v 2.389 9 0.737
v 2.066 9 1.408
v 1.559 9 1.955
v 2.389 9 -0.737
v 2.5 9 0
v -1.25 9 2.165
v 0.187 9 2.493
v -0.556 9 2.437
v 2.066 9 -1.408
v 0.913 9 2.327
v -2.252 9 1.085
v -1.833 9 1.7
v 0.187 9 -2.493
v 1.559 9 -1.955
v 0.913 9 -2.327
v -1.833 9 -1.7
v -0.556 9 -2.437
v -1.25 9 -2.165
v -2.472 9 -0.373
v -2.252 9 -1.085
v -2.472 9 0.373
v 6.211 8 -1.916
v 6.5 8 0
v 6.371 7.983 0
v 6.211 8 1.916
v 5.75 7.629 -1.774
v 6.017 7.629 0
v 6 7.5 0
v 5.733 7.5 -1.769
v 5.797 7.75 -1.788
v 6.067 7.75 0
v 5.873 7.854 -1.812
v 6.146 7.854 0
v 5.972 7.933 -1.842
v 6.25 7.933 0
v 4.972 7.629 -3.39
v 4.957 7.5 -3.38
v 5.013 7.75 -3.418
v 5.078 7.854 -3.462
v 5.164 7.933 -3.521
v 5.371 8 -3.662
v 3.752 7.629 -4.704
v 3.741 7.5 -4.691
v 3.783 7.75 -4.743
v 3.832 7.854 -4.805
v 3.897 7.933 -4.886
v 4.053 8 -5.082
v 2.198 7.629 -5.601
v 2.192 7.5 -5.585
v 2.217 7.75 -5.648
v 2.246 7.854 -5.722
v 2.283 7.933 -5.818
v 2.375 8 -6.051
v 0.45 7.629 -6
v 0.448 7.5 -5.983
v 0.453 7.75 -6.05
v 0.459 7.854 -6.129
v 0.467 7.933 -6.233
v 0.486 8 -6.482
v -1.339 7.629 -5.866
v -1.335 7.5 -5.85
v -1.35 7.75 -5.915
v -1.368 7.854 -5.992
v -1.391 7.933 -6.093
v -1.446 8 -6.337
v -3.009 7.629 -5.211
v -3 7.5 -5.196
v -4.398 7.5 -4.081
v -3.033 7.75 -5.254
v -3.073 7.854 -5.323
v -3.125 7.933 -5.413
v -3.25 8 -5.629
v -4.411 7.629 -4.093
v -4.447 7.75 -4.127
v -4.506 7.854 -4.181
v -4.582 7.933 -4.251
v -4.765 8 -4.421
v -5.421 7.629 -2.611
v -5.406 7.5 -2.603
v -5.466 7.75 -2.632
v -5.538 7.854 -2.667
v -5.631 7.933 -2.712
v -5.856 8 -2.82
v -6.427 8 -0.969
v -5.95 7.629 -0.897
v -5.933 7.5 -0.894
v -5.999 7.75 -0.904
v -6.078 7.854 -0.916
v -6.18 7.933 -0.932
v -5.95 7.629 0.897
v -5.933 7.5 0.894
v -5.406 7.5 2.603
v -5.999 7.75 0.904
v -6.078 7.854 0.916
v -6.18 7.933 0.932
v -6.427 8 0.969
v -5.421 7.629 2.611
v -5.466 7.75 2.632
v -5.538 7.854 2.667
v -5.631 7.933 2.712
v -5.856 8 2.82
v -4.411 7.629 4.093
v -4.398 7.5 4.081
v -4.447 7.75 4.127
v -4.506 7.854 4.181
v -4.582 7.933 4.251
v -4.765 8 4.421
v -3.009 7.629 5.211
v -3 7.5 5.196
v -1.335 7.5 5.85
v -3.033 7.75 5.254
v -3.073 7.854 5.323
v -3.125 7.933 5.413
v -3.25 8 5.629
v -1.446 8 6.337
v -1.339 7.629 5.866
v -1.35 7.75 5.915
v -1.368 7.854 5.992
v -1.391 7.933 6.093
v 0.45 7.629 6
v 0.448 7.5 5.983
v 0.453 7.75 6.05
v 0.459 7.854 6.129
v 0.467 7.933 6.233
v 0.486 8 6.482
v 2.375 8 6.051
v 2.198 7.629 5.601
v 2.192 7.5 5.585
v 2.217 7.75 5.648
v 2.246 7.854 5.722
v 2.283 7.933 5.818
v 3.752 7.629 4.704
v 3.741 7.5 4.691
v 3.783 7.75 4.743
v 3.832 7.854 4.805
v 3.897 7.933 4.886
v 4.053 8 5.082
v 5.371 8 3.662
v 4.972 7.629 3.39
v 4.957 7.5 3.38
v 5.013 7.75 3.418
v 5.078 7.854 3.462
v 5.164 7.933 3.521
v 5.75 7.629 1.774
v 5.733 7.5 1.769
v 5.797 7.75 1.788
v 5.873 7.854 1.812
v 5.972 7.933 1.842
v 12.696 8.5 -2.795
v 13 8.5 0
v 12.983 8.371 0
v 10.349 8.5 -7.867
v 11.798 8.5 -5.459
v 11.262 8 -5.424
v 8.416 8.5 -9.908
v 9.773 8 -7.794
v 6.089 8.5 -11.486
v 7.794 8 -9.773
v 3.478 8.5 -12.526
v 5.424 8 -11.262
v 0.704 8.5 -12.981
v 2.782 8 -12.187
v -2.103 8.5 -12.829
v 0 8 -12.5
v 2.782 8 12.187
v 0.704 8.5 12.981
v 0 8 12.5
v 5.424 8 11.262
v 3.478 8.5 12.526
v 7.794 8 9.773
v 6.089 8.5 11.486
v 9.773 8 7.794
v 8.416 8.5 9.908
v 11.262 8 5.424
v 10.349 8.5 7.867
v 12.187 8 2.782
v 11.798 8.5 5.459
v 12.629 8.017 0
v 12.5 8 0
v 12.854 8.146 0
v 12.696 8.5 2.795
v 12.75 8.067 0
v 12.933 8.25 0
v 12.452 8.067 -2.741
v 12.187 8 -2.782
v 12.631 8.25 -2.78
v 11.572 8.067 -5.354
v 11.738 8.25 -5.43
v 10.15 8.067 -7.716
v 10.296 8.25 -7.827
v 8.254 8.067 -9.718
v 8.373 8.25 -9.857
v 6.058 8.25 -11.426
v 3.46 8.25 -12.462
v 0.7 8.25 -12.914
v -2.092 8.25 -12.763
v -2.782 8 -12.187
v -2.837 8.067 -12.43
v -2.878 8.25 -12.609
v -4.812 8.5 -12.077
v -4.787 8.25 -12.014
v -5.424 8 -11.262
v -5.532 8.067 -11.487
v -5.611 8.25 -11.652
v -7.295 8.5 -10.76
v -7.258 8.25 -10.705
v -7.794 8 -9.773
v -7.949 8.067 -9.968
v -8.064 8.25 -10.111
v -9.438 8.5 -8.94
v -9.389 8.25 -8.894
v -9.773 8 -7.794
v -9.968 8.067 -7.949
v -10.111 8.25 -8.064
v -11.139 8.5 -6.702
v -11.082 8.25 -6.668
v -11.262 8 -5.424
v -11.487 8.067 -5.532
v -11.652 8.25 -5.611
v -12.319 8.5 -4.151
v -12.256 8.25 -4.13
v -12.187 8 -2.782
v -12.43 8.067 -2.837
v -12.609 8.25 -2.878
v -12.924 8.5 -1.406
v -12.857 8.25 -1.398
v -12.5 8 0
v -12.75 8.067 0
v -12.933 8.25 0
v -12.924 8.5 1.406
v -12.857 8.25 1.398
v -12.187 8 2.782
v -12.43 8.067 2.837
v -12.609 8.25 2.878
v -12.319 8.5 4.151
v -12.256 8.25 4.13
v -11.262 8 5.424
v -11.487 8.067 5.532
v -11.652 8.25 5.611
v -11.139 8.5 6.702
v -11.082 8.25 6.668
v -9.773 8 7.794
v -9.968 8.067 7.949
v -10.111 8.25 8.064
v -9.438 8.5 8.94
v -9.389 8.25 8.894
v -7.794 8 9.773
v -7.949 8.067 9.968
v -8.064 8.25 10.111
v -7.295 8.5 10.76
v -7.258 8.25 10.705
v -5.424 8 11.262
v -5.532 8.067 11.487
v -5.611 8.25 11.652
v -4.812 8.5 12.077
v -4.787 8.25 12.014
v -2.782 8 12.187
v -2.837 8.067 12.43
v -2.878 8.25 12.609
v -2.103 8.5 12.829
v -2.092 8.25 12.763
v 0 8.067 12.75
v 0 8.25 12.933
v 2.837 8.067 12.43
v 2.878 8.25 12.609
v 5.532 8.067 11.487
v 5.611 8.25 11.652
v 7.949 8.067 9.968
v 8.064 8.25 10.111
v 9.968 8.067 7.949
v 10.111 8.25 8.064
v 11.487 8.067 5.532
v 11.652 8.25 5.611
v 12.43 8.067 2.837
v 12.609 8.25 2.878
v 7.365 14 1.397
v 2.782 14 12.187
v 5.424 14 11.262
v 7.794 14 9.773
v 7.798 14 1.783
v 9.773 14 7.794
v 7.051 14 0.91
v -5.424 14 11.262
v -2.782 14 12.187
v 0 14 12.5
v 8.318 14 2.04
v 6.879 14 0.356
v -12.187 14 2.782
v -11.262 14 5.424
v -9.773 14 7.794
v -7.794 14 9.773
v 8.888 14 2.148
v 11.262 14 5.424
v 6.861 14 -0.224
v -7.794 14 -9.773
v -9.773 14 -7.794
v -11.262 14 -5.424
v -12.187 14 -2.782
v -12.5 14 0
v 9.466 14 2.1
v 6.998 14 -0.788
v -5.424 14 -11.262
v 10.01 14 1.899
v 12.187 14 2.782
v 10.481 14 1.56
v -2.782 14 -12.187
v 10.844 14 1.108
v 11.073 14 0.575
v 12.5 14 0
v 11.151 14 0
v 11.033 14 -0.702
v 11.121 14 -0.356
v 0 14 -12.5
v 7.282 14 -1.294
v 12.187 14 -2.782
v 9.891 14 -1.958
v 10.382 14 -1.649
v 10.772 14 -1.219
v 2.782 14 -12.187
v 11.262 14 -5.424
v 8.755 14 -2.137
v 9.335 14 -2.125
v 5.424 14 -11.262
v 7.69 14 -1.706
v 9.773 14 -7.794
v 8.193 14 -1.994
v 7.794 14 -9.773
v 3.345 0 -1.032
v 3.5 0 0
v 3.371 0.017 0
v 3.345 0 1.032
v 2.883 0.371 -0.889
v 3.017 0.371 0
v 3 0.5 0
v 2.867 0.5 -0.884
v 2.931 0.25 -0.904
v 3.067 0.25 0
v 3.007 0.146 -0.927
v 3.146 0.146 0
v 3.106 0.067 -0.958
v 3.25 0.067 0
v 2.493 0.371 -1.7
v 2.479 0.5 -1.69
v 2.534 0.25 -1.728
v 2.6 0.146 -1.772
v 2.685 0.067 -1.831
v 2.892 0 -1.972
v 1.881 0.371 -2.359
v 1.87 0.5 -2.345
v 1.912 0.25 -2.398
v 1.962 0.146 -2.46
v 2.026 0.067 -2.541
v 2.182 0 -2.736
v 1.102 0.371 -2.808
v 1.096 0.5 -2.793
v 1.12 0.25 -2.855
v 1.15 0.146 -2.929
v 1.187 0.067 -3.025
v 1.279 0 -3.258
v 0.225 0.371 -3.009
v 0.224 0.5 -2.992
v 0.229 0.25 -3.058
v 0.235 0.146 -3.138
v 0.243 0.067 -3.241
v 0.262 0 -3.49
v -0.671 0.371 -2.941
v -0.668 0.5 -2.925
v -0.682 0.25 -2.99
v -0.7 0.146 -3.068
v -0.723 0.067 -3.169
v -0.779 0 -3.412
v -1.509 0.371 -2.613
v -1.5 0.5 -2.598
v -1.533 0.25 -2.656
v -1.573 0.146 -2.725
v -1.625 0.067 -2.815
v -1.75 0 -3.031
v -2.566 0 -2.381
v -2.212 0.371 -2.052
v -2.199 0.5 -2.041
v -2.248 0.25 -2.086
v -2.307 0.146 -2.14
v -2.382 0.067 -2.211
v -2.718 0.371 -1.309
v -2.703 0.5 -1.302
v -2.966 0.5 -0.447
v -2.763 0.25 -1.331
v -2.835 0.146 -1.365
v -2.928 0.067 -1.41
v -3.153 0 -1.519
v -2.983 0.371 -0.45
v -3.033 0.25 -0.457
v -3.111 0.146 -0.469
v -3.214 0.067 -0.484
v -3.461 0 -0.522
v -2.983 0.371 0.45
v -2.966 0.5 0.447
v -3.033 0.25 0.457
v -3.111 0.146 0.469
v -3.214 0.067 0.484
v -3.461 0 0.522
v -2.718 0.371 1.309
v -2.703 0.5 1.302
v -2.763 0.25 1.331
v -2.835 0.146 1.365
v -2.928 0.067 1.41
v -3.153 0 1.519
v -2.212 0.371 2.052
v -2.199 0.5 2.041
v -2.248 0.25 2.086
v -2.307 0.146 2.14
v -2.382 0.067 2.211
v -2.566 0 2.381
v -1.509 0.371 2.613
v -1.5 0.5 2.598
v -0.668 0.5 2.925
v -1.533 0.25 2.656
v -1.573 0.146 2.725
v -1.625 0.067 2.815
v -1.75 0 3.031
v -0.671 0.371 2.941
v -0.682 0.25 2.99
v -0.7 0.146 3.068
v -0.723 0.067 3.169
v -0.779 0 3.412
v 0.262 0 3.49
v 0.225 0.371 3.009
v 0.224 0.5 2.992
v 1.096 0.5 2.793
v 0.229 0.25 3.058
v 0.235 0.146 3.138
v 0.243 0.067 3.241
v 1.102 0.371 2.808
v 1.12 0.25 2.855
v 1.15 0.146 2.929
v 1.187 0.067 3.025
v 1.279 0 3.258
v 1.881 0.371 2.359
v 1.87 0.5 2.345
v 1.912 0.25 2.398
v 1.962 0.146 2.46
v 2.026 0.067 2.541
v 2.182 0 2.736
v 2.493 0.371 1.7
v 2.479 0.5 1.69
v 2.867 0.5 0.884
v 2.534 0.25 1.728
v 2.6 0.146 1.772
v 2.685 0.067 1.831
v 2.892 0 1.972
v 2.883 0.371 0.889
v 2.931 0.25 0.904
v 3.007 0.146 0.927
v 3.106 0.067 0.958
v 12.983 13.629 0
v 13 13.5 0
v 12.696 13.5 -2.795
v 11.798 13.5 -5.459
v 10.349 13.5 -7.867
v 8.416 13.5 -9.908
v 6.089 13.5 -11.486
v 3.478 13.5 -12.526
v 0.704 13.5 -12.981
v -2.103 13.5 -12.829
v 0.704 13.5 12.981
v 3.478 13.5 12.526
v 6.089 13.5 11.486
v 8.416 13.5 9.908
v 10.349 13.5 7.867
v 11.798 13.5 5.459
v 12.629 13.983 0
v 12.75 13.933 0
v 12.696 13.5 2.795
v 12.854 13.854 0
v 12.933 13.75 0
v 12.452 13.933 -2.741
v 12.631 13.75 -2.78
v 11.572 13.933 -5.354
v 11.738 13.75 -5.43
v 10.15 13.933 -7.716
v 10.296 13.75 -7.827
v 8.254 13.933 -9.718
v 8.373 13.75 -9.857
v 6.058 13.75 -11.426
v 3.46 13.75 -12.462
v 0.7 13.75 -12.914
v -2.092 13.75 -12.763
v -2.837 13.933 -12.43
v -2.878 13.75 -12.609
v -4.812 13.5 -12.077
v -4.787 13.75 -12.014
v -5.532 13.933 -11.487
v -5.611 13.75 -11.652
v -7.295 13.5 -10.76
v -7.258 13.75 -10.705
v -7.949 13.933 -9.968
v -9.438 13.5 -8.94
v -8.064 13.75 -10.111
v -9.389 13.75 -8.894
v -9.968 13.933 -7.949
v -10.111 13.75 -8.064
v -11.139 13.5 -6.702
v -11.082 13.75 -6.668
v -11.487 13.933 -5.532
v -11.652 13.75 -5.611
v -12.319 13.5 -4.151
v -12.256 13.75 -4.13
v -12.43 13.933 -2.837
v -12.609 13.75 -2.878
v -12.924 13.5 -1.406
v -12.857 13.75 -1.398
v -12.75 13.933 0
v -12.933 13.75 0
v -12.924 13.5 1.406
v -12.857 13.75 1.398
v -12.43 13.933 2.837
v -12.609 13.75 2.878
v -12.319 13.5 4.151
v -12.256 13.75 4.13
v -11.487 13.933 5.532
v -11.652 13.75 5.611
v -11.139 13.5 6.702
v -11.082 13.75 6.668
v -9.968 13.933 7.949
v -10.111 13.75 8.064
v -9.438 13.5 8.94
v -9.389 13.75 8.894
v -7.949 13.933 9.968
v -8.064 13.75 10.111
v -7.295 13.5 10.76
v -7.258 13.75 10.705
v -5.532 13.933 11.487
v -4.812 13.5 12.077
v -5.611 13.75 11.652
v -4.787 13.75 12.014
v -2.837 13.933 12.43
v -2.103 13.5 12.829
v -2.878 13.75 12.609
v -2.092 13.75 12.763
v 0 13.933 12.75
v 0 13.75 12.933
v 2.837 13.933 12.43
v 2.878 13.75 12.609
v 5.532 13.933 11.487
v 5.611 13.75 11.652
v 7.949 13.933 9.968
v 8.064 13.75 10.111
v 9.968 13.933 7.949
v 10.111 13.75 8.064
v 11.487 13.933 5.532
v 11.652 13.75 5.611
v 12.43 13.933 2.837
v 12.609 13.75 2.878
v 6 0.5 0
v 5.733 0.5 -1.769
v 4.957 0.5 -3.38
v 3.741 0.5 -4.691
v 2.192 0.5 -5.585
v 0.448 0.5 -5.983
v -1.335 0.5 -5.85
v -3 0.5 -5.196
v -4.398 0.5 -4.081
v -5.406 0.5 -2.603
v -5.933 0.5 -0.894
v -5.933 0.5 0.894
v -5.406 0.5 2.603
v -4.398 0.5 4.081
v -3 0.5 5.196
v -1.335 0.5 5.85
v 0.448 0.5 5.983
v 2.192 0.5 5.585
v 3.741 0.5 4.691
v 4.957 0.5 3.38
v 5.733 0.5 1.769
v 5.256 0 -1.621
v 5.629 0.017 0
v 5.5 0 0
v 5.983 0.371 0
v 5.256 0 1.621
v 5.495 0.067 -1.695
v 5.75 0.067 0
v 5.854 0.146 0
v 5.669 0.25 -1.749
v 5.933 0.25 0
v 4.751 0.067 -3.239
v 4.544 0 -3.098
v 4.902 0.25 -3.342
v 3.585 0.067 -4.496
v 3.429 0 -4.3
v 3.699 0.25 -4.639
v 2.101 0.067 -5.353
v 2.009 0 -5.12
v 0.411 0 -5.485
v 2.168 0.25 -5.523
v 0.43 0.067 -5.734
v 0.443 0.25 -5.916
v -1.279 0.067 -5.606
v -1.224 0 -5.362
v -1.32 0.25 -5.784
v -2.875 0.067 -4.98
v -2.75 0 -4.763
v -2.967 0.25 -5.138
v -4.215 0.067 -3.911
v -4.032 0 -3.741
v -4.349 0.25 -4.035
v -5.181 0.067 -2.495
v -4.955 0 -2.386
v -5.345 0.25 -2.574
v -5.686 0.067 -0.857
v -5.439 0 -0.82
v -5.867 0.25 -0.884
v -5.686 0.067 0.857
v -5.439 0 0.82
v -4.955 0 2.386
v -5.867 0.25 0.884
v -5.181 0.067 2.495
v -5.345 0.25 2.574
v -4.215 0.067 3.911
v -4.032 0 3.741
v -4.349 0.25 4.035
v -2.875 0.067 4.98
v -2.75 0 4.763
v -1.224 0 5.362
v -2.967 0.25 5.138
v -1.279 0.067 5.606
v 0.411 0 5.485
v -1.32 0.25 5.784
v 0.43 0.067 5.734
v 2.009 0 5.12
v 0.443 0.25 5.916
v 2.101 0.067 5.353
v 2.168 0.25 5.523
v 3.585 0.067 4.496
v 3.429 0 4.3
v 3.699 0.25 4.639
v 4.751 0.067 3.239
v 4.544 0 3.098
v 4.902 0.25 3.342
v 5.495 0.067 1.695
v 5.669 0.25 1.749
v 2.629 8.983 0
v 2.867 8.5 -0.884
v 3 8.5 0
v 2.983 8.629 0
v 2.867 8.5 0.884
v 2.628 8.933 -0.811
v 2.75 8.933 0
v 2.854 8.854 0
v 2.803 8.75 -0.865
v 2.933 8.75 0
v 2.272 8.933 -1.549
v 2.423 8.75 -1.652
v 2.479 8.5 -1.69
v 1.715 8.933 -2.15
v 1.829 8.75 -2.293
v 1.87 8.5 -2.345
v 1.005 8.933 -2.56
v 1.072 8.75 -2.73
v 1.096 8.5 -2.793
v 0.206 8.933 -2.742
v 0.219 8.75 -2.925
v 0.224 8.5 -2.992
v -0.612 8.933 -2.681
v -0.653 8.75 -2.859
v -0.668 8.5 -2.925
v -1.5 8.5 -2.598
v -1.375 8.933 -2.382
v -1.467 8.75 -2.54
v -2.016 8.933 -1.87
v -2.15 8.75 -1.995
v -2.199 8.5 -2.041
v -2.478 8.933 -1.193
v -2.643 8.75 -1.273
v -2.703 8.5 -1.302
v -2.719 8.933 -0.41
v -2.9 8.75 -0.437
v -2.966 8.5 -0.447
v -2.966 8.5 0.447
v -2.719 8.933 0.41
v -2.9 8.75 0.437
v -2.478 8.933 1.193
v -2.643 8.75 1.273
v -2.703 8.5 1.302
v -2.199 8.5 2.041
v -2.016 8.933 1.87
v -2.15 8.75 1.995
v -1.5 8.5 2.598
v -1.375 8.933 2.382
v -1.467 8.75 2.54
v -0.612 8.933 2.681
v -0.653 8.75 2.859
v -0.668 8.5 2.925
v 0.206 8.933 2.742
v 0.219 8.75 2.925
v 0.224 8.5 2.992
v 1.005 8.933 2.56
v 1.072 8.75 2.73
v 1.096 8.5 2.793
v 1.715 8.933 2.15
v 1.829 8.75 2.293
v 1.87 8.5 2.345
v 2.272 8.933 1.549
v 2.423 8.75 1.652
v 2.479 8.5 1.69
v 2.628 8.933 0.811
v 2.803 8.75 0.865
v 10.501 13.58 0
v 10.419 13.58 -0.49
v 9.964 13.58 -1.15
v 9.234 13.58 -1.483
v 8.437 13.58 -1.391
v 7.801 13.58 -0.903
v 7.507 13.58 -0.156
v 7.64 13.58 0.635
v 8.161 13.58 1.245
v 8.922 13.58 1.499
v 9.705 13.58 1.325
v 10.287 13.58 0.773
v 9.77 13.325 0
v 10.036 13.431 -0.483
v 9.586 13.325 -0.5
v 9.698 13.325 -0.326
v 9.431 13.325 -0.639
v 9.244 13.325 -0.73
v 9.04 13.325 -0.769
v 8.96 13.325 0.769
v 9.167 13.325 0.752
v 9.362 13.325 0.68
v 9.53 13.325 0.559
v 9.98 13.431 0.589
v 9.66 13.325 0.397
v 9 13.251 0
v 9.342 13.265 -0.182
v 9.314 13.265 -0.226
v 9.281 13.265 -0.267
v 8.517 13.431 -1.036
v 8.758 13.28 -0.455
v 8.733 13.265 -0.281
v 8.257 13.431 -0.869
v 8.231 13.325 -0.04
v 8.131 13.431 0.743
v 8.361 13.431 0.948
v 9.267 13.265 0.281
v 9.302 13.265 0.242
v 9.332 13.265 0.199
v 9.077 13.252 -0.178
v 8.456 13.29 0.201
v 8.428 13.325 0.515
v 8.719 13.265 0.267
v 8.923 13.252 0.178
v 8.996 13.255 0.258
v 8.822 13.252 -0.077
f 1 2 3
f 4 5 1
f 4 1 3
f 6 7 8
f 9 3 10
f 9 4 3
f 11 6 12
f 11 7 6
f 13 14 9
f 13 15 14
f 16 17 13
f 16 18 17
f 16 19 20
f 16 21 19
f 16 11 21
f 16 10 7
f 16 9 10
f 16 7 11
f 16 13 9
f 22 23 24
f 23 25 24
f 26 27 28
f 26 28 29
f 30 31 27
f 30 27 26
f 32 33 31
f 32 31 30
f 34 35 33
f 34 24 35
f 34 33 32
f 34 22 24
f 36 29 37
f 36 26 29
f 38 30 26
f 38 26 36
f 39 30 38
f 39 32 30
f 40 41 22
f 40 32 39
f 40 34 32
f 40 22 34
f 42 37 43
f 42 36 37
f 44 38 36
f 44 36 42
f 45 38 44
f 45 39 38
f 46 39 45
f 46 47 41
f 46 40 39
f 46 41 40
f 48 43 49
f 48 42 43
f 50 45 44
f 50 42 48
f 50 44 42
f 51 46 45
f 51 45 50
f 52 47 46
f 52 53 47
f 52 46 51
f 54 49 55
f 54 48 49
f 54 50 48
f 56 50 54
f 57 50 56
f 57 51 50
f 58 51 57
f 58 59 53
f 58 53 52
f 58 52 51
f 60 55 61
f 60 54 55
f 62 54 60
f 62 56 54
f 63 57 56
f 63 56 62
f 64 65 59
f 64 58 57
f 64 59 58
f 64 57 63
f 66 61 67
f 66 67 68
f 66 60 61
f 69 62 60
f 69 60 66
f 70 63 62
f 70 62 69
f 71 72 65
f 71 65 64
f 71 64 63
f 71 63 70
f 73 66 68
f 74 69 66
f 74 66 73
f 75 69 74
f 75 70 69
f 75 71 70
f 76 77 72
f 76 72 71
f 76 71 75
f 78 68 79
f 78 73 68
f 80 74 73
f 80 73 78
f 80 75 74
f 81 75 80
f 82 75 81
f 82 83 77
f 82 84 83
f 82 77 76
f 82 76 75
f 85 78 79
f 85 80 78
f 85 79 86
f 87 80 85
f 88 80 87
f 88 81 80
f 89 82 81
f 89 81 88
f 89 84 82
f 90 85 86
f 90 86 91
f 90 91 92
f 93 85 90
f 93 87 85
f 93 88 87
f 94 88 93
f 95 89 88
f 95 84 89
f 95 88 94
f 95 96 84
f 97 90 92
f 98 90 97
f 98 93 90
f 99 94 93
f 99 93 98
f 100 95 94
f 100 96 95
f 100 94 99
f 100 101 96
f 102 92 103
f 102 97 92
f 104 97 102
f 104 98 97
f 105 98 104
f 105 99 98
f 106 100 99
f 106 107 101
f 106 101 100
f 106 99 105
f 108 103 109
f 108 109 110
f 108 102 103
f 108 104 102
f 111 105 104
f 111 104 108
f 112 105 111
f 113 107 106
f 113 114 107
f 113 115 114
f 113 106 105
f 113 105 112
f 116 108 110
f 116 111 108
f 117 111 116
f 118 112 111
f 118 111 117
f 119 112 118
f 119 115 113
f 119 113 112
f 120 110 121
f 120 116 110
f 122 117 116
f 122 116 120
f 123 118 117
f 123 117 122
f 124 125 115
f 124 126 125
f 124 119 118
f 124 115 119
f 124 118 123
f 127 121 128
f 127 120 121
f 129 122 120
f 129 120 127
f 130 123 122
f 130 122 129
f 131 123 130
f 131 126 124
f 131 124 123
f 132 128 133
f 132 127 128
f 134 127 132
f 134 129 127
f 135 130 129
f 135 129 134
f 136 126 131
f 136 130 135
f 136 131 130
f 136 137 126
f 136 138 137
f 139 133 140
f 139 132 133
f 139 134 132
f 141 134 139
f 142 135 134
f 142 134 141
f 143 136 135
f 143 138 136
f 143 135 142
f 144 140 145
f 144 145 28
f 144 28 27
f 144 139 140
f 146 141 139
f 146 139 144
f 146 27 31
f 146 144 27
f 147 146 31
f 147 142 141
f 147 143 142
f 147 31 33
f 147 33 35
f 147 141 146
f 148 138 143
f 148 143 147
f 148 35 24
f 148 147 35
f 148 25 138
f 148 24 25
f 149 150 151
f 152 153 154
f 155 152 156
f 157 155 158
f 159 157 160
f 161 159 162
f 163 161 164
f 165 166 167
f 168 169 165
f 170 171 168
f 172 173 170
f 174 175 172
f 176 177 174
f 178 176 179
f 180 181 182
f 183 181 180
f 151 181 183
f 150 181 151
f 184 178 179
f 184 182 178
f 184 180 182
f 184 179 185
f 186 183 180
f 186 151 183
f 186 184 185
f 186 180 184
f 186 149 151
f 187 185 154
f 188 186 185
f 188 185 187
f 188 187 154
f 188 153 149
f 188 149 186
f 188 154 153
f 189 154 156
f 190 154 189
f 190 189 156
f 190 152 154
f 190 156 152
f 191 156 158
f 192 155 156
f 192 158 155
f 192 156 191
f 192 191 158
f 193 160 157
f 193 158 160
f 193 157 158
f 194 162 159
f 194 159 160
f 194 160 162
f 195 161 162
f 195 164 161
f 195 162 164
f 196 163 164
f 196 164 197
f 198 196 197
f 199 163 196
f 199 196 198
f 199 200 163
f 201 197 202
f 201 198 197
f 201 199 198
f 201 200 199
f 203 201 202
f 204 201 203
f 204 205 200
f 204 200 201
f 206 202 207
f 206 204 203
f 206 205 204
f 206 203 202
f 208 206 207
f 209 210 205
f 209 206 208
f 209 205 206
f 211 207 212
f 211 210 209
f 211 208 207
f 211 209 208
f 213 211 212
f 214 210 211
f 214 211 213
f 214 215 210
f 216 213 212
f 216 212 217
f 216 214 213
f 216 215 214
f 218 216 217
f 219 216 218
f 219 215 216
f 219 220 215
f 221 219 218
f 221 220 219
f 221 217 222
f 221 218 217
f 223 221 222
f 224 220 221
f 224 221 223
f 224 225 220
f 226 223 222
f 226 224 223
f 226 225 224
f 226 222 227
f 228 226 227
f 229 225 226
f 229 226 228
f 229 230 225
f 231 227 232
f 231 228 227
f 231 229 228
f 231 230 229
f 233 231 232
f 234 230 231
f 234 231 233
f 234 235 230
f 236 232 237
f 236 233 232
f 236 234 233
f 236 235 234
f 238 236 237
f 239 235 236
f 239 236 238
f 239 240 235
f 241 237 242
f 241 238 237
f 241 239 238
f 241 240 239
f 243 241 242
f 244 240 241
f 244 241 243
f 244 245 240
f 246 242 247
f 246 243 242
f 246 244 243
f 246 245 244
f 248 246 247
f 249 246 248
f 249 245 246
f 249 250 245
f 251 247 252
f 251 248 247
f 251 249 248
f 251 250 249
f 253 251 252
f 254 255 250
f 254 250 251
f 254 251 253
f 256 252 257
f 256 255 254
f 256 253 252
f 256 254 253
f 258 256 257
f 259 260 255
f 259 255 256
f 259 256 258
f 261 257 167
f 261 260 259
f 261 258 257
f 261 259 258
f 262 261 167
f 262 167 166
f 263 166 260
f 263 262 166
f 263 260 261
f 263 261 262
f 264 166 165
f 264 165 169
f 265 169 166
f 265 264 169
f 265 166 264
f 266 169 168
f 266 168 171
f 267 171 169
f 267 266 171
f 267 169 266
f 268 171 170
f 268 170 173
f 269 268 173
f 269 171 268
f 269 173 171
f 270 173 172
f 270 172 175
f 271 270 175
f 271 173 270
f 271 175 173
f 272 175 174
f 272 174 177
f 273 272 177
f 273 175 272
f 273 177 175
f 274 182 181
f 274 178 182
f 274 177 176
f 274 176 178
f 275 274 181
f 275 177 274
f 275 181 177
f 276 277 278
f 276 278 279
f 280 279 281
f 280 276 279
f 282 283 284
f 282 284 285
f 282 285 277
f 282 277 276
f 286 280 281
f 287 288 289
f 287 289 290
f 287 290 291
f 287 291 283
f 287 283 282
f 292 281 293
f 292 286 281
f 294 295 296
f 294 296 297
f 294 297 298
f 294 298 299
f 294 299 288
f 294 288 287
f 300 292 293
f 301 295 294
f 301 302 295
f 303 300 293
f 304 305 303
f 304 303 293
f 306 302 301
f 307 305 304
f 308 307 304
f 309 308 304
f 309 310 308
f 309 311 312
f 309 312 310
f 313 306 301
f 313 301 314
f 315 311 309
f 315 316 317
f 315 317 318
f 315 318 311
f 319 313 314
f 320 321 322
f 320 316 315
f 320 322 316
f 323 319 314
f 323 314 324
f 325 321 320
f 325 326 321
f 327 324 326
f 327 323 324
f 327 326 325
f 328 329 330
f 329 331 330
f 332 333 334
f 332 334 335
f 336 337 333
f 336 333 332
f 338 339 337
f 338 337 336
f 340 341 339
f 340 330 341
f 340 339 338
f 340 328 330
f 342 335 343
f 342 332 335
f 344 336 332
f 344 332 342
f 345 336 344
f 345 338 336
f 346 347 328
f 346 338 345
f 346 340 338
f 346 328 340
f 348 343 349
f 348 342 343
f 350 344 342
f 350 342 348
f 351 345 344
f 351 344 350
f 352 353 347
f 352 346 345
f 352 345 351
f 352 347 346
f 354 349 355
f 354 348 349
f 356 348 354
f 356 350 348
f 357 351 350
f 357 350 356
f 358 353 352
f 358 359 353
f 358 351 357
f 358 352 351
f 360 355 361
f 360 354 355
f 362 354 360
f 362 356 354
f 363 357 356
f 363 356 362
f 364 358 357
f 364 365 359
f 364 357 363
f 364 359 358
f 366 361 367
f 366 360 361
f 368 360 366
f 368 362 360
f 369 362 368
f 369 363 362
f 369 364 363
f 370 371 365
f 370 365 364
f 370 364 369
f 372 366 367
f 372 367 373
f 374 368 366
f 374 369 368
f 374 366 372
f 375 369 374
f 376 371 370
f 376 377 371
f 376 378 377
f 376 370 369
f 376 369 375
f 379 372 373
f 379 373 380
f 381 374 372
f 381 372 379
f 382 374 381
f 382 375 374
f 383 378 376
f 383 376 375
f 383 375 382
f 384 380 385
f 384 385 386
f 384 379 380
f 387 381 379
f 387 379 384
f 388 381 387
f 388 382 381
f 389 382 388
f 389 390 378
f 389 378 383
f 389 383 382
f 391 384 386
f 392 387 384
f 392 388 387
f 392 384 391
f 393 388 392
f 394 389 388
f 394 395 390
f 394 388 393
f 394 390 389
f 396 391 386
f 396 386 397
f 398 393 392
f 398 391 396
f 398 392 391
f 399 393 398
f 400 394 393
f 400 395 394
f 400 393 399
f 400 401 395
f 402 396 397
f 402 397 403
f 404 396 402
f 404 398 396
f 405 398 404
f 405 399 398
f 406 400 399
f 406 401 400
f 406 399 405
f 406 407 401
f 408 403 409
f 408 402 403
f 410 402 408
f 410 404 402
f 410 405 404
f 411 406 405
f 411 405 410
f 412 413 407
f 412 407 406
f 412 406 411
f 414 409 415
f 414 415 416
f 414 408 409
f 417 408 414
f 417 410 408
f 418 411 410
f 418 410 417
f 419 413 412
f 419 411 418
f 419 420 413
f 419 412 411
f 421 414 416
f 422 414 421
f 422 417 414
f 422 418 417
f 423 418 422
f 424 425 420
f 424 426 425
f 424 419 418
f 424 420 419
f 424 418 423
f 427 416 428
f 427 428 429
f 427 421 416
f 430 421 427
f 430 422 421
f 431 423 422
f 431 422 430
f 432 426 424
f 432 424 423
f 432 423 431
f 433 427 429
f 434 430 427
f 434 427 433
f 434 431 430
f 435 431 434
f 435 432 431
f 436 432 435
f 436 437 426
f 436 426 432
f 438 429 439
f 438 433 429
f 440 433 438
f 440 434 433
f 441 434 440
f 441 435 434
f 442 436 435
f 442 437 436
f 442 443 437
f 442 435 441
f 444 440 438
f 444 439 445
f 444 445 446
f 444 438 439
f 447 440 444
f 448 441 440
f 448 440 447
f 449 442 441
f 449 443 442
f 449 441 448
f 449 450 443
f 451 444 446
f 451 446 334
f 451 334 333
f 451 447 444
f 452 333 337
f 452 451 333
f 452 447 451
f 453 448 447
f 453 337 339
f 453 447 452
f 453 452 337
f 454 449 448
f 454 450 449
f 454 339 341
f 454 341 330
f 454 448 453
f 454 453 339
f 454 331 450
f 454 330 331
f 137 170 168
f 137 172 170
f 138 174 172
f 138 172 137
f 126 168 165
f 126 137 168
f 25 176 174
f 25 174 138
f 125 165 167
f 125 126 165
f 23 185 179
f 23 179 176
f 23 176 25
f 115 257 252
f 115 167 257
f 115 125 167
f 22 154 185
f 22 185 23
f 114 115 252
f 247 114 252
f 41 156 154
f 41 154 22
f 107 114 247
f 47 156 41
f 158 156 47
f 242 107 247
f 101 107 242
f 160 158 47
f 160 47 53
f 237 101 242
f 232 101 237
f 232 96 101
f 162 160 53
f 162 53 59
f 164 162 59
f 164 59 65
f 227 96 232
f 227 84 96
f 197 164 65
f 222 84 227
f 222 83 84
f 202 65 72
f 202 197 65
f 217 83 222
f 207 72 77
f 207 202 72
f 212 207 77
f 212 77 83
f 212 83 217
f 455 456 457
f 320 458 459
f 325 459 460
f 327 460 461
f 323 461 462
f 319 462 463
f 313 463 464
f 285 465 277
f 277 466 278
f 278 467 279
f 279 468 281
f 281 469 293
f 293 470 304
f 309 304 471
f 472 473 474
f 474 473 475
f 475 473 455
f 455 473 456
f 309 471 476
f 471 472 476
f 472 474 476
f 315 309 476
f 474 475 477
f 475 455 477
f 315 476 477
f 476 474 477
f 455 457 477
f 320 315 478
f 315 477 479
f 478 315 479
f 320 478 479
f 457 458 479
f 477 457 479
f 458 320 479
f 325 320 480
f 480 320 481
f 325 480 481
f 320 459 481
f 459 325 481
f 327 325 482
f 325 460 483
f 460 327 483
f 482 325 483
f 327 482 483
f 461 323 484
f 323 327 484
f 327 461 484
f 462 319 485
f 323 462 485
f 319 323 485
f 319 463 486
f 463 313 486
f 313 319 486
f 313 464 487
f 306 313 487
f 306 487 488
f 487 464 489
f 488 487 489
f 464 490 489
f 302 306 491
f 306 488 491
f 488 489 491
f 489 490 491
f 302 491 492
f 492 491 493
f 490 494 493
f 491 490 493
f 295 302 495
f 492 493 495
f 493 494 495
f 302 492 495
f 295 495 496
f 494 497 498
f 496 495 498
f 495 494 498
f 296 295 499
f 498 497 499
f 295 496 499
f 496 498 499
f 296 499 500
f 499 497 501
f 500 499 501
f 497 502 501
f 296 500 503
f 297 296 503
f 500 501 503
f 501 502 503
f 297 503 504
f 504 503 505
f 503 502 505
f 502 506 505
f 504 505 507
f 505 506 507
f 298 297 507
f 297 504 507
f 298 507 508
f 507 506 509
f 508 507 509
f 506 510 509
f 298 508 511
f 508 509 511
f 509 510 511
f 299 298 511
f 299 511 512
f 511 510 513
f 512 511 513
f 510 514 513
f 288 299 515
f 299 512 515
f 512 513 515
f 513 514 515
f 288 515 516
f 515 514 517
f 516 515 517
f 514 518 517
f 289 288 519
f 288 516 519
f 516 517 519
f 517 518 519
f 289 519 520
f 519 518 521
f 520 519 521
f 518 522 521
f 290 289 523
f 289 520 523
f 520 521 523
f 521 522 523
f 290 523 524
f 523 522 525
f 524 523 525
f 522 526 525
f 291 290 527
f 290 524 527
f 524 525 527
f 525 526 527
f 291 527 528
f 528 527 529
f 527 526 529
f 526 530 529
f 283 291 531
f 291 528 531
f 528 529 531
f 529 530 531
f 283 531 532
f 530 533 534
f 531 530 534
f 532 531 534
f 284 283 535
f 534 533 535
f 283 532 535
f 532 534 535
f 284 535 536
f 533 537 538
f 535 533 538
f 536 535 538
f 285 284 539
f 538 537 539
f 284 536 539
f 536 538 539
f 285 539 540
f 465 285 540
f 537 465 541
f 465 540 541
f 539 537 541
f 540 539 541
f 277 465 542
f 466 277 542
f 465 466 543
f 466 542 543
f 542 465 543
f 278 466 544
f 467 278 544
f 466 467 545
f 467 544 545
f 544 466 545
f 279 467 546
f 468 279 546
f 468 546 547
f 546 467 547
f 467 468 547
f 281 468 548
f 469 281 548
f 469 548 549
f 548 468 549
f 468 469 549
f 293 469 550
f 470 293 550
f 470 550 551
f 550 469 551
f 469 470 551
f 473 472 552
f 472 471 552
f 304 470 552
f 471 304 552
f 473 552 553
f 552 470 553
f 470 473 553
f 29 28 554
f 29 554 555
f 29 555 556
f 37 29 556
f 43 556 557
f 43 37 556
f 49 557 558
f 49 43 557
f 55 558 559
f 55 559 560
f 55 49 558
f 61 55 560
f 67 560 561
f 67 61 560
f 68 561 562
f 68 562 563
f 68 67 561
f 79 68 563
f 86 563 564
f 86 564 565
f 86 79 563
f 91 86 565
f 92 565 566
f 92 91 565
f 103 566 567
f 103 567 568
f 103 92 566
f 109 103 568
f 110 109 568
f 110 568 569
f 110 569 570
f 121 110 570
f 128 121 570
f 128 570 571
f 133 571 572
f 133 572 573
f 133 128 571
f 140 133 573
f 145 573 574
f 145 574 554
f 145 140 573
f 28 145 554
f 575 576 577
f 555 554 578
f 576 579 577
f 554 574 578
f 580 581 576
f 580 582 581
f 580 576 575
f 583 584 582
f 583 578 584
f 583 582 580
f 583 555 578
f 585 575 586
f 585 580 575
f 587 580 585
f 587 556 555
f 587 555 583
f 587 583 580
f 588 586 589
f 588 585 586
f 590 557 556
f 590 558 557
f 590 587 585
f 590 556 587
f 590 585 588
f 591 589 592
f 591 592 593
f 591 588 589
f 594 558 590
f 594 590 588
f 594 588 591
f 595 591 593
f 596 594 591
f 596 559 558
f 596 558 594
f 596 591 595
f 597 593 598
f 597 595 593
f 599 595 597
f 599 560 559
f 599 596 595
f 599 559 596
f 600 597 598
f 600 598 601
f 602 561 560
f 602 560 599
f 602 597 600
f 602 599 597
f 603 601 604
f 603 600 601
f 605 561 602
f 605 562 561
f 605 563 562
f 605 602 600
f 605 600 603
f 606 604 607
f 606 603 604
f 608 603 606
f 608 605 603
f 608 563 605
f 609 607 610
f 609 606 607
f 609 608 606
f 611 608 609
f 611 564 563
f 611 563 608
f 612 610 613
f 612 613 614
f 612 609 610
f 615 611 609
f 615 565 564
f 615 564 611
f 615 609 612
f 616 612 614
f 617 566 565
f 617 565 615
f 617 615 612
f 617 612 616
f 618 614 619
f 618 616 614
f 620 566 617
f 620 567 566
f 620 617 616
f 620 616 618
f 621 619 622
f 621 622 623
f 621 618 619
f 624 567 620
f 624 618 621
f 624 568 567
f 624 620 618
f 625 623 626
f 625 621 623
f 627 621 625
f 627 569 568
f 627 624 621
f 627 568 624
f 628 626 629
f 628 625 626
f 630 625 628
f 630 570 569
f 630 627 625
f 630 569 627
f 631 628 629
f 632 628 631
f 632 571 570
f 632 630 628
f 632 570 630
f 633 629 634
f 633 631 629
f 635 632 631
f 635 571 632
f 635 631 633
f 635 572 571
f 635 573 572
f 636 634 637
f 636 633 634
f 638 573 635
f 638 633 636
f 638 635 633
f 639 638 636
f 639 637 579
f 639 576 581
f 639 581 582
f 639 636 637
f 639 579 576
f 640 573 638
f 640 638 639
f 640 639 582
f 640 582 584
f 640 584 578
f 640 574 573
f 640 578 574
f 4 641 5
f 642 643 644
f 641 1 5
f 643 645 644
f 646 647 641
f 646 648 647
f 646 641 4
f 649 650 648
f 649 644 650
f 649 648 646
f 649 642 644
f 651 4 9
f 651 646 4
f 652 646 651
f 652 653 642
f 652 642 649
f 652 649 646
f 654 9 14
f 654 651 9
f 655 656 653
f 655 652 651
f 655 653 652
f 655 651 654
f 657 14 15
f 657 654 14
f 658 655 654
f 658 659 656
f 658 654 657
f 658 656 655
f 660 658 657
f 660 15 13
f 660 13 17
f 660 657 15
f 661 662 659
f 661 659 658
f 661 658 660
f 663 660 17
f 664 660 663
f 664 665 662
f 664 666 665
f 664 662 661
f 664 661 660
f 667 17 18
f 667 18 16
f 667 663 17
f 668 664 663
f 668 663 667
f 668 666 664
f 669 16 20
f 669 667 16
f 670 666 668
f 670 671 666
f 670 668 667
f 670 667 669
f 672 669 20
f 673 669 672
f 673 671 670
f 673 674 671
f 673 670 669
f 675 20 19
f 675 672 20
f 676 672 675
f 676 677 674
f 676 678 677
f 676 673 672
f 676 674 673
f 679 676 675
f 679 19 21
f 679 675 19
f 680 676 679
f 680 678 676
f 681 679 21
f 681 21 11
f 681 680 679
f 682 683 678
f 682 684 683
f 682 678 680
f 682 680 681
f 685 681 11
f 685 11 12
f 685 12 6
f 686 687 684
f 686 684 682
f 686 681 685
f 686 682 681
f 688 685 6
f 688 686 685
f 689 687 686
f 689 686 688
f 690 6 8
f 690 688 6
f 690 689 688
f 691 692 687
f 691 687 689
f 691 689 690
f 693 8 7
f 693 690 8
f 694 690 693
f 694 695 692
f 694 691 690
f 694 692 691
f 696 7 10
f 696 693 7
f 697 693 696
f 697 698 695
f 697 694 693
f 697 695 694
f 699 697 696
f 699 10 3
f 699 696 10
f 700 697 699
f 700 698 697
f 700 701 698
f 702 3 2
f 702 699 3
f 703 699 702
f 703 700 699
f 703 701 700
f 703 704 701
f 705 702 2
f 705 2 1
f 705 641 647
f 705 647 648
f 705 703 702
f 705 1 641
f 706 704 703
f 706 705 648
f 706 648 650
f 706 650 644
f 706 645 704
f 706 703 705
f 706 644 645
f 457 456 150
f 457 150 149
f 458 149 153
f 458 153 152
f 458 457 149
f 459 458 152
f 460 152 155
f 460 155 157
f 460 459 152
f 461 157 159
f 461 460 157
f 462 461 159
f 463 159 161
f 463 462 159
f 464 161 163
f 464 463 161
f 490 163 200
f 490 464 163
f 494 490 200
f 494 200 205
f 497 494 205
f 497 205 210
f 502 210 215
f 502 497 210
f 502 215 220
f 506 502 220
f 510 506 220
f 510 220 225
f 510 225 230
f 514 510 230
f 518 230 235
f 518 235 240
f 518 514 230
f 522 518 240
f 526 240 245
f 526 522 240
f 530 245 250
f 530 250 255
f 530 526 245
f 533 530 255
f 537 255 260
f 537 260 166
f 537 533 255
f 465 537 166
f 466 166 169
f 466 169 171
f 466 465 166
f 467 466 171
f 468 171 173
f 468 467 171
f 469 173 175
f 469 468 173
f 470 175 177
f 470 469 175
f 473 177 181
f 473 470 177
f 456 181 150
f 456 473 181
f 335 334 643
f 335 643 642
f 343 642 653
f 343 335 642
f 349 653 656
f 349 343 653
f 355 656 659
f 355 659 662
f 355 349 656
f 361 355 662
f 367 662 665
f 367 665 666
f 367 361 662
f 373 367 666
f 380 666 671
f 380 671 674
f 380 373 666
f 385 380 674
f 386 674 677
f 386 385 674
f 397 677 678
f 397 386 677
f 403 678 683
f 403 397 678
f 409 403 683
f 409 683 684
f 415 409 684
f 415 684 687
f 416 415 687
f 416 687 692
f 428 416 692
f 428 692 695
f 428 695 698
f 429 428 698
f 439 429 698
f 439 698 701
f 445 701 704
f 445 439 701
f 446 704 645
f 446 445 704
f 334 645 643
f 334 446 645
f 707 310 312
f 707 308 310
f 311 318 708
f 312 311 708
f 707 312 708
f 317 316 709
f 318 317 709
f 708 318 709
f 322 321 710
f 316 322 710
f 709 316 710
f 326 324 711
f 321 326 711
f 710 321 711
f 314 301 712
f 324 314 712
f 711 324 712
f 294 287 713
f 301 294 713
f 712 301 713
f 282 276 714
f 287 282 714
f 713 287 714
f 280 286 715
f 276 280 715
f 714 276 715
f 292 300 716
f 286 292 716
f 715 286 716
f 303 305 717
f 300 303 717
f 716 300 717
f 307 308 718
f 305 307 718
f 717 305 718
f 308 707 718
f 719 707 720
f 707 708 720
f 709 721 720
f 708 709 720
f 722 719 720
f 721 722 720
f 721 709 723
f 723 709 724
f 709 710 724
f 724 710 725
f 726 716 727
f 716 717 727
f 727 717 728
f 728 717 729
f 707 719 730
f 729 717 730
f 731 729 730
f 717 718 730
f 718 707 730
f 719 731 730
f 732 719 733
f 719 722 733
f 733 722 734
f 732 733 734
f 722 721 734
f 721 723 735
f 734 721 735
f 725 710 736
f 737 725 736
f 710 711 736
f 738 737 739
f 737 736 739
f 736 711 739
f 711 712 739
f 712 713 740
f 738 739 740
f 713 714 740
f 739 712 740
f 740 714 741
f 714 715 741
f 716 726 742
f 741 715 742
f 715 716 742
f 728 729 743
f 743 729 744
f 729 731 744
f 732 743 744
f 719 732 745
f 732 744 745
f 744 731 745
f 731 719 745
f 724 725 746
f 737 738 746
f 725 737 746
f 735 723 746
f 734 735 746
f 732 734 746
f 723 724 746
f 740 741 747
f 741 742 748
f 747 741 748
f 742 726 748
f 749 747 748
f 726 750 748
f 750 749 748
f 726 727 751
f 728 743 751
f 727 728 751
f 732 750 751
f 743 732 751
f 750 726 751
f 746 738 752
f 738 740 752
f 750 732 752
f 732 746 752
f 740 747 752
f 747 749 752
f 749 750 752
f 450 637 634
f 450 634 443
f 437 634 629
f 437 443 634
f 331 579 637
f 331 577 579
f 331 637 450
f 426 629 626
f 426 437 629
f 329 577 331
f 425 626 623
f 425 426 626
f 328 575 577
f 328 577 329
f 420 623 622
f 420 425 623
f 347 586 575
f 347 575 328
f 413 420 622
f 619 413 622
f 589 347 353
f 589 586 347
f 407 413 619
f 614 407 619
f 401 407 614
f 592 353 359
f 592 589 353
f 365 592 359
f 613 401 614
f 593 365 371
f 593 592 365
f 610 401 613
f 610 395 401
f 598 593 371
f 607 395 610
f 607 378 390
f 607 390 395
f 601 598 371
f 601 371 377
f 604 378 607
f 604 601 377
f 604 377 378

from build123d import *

# Parameters (mm, degrees)
F2_R = 0.5


with BuildPart() as f1:
    # F0 (on Top) → F1 (revolve)
    with BuildSketch(Plane.XY):
        Polygon((13, 14), (0, 14), (0, 9), (3, 9), (3, 0), (6, 0), (6, 8), (13, 8), align=None)
    revolve(axis=Axis((0, 0.918181, 0), (0, 1, 0)))

    # F2
    f2_edges = [f1.edges().sort_by_distance(p)[0] for p in [
        (-13, 14, 0),
        (-13, 8, 0),
        (-6, 0, 0),
        (-6, 8, 0),
        (6, 4, 0),
        (-3, 9, 0),
        (-3, 0, 0),
        (3, 4.5, 0),
    ]]
    fillet(f2_edges, radius=F2_R)

    # F3 (on Top) → F4 (revolve, cut)
    with BuildSketch(Plane.XY):
        with BuildLine():
            Line((9, 19.749151), (9, 13.250849))
            ThreePointArc((9, 13.250849), (12.324263, 16.5), (9, 19.749151))
        make_face()
    revolve(axis=Axis((9, 16.5, 0), (0, 1, 0)), mode=Mode.SUBTRACT)


solid = f1.part
